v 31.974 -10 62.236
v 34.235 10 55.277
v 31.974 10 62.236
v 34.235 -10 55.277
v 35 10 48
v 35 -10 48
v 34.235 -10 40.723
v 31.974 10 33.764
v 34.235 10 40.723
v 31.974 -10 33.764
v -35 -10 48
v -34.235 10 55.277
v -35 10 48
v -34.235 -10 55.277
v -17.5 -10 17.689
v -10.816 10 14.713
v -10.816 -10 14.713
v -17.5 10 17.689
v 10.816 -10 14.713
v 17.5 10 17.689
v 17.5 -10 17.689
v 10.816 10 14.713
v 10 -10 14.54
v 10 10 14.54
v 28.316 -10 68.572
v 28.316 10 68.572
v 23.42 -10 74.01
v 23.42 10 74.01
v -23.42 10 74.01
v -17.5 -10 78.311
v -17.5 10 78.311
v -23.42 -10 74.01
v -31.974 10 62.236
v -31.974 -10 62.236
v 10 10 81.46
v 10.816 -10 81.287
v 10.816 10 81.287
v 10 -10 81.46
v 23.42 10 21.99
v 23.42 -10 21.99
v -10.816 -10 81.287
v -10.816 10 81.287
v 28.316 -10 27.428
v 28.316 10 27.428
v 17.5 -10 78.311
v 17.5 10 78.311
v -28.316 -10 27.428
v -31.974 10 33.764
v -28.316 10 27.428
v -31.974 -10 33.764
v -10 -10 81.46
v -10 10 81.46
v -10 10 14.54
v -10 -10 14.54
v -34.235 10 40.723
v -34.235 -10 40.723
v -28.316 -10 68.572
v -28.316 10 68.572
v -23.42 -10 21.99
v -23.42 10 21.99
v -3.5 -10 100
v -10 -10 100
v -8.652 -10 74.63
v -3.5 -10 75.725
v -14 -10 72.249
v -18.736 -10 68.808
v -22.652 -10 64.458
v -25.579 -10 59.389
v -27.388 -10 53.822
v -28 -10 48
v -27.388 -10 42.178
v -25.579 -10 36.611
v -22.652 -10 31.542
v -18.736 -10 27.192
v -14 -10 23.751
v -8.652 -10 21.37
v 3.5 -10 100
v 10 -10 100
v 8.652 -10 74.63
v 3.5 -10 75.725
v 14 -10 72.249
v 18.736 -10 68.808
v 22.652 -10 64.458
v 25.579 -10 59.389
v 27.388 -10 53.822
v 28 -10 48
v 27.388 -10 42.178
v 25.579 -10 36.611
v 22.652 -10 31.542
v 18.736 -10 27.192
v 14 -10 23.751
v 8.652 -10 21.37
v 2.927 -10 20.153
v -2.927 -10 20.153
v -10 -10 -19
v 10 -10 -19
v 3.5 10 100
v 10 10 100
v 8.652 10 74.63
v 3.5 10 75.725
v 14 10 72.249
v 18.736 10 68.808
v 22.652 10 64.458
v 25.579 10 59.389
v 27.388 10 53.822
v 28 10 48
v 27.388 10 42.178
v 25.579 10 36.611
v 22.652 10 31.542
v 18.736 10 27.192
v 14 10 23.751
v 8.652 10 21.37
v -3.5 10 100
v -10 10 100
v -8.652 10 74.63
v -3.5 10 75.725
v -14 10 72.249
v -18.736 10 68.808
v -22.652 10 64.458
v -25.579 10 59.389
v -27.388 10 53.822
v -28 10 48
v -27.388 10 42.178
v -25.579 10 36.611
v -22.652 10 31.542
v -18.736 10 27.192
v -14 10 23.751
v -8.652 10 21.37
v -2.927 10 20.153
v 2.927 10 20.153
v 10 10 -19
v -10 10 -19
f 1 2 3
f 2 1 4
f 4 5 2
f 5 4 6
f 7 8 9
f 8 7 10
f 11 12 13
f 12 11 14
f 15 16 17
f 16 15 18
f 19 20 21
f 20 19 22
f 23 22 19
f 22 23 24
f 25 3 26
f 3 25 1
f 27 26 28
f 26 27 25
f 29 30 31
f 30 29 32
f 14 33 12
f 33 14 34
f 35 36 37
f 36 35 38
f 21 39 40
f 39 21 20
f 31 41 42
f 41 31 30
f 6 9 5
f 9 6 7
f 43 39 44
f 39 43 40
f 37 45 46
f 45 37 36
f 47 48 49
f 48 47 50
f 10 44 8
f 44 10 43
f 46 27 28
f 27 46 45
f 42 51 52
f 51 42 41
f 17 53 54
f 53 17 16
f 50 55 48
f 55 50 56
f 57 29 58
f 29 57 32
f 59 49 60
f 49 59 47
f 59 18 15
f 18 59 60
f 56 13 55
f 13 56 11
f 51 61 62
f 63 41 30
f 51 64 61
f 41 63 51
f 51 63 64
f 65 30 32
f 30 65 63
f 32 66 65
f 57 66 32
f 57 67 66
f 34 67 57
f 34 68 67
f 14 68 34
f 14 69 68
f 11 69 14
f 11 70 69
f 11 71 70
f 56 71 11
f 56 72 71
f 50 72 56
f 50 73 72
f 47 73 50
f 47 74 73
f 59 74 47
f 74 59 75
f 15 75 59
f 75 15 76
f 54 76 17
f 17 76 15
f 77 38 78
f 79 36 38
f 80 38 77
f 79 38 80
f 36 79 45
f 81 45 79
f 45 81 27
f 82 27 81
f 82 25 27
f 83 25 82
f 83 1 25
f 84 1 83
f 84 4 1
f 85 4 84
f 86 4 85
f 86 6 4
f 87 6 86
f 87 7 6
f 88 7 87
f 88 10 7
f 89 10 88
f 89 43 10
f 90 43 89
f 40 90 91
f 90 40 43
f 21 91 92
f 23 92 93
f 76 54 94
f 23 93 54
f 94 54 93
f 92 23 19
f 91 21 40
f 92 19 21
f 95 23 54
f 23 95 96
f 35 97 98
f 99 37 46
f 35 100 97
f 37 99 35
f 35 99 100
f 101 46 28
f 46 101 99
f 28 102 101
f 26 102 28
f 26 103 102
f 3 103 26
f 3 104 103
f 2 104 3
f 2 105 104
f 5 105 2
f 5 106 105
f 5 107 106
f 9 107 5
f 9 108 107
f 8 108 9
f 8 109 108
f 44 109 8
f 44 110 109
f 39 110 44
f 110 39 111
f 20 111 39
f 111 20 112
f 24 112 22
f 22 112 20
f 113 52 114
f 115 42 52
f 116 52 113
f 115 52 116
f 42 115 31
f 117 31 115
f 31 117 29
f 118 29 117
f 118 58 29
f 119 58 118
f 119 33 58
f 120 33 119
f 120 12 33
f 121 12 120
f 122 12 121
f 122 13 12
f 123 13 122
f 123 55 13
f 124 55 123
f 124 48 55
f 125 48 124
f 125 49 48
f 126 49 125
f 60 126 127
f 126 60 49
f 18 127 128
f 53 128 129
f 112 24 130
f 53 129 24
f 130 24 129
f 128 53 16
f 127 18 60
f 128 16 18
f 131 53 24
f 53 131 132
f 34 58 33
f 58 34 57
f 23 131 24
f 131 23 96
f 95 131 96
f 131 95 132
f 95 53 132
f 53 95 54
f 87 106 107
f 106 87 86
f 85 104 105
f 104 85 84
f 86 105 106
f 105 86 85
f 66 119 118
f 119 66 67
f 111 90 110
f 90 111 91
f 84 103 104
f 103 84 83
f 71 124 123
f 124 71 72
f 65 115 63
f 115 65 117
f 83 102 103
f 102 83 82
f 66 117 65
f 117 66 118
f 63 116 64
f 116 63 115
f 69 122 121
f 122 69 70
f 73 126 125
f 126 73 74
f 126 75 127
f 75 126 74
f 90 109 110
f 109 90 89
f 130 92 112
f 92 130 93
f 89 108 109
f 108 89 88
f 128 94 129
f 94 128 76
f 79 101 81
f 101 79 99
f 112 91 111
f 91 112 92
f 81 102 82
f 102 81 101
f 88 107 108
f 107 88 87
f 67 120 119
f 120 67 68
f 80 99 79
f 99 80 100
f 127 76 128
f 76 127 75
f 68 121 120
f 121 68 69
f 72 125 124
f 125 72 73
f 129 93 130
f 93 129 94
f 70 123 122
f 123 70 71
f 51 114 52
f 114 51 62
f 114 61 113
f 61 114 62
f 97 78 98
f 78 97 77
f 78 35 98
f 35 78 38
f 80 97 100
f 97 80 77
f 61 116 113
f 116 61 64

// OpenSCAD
difference() 
{ 
// ode�et distan�n� mezery


union() 
{
// p�i�ten� patic pro sta�en�

difference() 
{ 
// diffference pro  otvor pro osazen� na ty�



union() 
{
// union pro v�lec napojen� na cylinder pro zasazen� do rukojeti

union() 
// union pro p�ipojen� cylinderu na v�lec
{


//cylinder(h = 14, r1 = 17, r2 = 10, center = true); 
//cylinder-nepouzite skoseni napojeni tyce pro usazeni v rukojeti

//zakladn�
translate([0,10,48]) rotate ([90,0,0])cylinder(h = 20, r=35);
// 40 je nastavena vnitrni prumer na 35 a vnejsi na 40
        
} 
#translate([-10,-10,-19]) cube([20,20,35]); 
// umisteni ctverce pro dosazeni do rukojeti
//tloustka operky je 4mm + 14mm pro zesileni
//19 je posun nahoru a dolu/////35 vyska propojky
}
translate([0,10,48]) rotate ([90,0,0])cylinder(h = 20, r=28);
// odecitaci valec pro otvor na osazen� ty�e
}
translate([0,0,90]) rotate ([90,0,0]) cube(size = [20,20,20], center = true);
//sloupky pro utazeni
}
translate([0,10,90]) rotate ([0,0,0])cube(size = [7,50,40], center = true);
//odecet distancni mezery
}        


//# pro zviditeleneni
//priblizeni shift+prav tlacitko mysi+ pousouvani dopredu/dozadu
